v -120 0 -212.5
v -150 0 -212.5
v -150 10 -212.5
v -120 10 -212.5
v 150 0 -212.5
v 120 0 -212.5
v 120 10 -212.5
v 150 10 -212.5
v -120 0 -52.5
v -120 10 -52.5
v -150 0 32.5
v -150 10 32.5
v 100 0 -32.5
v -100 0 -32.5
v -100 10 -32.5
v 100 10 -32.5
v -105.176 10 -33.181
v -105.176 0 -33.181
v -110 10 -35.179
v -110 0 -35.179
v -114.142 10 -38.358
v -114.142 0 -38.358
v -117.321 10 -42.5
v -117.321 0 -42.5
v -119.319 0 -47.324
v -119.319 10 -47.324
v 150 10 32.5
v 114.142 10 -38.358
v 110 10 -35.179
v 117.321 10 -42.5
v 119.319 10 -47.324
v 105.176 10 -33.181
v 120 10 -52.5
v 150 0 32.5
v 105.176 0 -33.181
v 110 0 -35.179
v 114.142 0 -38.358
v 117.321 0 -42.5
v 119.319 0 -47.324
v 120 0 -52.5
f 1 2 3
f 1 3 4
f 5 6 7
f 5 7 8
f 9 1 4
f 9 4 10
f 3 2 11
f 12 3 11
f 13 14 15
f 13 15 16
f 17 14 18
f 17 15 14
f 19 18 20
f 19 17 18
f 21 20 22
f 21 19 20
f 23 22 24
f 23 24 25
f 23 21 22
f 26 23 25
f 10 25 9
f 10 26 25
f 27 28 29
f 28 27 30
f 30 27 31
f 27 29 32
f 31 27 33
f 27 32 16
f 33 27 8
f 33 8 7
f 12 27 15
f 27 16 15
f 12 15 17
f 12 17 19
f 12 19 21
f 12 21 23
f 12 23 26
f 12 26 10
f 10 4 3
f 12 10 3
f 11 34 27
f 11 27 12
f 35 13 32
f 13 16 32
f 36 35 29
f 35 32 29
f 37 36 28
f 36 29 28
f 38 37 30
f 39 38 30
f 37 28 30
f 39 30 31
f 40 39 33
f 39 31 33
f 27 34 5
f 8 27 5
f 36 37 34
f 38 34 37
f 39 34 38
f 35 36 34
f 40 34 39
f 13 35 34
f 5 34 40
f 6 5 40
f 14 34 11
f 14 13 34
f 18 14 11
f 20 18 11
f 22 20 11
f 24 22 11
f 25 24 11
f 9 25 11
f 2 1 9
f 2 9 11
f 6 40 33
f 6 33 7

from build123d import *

# Parameters (mm, degrees)
EXTRUDE_1_DEPTH = 10
FILLET_7_R      = 20


with BuildPart() as part:
    # 草图1 → 凸台-拉伸1 (new body)
    with BuildSketch(Plane(origin=(0, 0, 0), x_dir=(1, 0, 0), z_dir=(0, 1, 0))):
        Polygon((-120, 32.5), (120, 32.5), (120, 212.5), (150, 212.5), (150, 32.5), (150, -32.5), (-150, -32.5), (-150, 32.5), (-150, 212.5), (-120, 212.5), align=None)
    extrude(amount=EXTRUDE_1_DEPTH)

    # 圆角7
    fillet_7_edges = [part.edges().sort_by_distance(p)[0] for p in [
        (-120, 5, -32.5),
        (120, 5, -32.5),
    ]]
    fillet(fillet_7_edges, radius=FILLET_7_R)


solid = part.part
